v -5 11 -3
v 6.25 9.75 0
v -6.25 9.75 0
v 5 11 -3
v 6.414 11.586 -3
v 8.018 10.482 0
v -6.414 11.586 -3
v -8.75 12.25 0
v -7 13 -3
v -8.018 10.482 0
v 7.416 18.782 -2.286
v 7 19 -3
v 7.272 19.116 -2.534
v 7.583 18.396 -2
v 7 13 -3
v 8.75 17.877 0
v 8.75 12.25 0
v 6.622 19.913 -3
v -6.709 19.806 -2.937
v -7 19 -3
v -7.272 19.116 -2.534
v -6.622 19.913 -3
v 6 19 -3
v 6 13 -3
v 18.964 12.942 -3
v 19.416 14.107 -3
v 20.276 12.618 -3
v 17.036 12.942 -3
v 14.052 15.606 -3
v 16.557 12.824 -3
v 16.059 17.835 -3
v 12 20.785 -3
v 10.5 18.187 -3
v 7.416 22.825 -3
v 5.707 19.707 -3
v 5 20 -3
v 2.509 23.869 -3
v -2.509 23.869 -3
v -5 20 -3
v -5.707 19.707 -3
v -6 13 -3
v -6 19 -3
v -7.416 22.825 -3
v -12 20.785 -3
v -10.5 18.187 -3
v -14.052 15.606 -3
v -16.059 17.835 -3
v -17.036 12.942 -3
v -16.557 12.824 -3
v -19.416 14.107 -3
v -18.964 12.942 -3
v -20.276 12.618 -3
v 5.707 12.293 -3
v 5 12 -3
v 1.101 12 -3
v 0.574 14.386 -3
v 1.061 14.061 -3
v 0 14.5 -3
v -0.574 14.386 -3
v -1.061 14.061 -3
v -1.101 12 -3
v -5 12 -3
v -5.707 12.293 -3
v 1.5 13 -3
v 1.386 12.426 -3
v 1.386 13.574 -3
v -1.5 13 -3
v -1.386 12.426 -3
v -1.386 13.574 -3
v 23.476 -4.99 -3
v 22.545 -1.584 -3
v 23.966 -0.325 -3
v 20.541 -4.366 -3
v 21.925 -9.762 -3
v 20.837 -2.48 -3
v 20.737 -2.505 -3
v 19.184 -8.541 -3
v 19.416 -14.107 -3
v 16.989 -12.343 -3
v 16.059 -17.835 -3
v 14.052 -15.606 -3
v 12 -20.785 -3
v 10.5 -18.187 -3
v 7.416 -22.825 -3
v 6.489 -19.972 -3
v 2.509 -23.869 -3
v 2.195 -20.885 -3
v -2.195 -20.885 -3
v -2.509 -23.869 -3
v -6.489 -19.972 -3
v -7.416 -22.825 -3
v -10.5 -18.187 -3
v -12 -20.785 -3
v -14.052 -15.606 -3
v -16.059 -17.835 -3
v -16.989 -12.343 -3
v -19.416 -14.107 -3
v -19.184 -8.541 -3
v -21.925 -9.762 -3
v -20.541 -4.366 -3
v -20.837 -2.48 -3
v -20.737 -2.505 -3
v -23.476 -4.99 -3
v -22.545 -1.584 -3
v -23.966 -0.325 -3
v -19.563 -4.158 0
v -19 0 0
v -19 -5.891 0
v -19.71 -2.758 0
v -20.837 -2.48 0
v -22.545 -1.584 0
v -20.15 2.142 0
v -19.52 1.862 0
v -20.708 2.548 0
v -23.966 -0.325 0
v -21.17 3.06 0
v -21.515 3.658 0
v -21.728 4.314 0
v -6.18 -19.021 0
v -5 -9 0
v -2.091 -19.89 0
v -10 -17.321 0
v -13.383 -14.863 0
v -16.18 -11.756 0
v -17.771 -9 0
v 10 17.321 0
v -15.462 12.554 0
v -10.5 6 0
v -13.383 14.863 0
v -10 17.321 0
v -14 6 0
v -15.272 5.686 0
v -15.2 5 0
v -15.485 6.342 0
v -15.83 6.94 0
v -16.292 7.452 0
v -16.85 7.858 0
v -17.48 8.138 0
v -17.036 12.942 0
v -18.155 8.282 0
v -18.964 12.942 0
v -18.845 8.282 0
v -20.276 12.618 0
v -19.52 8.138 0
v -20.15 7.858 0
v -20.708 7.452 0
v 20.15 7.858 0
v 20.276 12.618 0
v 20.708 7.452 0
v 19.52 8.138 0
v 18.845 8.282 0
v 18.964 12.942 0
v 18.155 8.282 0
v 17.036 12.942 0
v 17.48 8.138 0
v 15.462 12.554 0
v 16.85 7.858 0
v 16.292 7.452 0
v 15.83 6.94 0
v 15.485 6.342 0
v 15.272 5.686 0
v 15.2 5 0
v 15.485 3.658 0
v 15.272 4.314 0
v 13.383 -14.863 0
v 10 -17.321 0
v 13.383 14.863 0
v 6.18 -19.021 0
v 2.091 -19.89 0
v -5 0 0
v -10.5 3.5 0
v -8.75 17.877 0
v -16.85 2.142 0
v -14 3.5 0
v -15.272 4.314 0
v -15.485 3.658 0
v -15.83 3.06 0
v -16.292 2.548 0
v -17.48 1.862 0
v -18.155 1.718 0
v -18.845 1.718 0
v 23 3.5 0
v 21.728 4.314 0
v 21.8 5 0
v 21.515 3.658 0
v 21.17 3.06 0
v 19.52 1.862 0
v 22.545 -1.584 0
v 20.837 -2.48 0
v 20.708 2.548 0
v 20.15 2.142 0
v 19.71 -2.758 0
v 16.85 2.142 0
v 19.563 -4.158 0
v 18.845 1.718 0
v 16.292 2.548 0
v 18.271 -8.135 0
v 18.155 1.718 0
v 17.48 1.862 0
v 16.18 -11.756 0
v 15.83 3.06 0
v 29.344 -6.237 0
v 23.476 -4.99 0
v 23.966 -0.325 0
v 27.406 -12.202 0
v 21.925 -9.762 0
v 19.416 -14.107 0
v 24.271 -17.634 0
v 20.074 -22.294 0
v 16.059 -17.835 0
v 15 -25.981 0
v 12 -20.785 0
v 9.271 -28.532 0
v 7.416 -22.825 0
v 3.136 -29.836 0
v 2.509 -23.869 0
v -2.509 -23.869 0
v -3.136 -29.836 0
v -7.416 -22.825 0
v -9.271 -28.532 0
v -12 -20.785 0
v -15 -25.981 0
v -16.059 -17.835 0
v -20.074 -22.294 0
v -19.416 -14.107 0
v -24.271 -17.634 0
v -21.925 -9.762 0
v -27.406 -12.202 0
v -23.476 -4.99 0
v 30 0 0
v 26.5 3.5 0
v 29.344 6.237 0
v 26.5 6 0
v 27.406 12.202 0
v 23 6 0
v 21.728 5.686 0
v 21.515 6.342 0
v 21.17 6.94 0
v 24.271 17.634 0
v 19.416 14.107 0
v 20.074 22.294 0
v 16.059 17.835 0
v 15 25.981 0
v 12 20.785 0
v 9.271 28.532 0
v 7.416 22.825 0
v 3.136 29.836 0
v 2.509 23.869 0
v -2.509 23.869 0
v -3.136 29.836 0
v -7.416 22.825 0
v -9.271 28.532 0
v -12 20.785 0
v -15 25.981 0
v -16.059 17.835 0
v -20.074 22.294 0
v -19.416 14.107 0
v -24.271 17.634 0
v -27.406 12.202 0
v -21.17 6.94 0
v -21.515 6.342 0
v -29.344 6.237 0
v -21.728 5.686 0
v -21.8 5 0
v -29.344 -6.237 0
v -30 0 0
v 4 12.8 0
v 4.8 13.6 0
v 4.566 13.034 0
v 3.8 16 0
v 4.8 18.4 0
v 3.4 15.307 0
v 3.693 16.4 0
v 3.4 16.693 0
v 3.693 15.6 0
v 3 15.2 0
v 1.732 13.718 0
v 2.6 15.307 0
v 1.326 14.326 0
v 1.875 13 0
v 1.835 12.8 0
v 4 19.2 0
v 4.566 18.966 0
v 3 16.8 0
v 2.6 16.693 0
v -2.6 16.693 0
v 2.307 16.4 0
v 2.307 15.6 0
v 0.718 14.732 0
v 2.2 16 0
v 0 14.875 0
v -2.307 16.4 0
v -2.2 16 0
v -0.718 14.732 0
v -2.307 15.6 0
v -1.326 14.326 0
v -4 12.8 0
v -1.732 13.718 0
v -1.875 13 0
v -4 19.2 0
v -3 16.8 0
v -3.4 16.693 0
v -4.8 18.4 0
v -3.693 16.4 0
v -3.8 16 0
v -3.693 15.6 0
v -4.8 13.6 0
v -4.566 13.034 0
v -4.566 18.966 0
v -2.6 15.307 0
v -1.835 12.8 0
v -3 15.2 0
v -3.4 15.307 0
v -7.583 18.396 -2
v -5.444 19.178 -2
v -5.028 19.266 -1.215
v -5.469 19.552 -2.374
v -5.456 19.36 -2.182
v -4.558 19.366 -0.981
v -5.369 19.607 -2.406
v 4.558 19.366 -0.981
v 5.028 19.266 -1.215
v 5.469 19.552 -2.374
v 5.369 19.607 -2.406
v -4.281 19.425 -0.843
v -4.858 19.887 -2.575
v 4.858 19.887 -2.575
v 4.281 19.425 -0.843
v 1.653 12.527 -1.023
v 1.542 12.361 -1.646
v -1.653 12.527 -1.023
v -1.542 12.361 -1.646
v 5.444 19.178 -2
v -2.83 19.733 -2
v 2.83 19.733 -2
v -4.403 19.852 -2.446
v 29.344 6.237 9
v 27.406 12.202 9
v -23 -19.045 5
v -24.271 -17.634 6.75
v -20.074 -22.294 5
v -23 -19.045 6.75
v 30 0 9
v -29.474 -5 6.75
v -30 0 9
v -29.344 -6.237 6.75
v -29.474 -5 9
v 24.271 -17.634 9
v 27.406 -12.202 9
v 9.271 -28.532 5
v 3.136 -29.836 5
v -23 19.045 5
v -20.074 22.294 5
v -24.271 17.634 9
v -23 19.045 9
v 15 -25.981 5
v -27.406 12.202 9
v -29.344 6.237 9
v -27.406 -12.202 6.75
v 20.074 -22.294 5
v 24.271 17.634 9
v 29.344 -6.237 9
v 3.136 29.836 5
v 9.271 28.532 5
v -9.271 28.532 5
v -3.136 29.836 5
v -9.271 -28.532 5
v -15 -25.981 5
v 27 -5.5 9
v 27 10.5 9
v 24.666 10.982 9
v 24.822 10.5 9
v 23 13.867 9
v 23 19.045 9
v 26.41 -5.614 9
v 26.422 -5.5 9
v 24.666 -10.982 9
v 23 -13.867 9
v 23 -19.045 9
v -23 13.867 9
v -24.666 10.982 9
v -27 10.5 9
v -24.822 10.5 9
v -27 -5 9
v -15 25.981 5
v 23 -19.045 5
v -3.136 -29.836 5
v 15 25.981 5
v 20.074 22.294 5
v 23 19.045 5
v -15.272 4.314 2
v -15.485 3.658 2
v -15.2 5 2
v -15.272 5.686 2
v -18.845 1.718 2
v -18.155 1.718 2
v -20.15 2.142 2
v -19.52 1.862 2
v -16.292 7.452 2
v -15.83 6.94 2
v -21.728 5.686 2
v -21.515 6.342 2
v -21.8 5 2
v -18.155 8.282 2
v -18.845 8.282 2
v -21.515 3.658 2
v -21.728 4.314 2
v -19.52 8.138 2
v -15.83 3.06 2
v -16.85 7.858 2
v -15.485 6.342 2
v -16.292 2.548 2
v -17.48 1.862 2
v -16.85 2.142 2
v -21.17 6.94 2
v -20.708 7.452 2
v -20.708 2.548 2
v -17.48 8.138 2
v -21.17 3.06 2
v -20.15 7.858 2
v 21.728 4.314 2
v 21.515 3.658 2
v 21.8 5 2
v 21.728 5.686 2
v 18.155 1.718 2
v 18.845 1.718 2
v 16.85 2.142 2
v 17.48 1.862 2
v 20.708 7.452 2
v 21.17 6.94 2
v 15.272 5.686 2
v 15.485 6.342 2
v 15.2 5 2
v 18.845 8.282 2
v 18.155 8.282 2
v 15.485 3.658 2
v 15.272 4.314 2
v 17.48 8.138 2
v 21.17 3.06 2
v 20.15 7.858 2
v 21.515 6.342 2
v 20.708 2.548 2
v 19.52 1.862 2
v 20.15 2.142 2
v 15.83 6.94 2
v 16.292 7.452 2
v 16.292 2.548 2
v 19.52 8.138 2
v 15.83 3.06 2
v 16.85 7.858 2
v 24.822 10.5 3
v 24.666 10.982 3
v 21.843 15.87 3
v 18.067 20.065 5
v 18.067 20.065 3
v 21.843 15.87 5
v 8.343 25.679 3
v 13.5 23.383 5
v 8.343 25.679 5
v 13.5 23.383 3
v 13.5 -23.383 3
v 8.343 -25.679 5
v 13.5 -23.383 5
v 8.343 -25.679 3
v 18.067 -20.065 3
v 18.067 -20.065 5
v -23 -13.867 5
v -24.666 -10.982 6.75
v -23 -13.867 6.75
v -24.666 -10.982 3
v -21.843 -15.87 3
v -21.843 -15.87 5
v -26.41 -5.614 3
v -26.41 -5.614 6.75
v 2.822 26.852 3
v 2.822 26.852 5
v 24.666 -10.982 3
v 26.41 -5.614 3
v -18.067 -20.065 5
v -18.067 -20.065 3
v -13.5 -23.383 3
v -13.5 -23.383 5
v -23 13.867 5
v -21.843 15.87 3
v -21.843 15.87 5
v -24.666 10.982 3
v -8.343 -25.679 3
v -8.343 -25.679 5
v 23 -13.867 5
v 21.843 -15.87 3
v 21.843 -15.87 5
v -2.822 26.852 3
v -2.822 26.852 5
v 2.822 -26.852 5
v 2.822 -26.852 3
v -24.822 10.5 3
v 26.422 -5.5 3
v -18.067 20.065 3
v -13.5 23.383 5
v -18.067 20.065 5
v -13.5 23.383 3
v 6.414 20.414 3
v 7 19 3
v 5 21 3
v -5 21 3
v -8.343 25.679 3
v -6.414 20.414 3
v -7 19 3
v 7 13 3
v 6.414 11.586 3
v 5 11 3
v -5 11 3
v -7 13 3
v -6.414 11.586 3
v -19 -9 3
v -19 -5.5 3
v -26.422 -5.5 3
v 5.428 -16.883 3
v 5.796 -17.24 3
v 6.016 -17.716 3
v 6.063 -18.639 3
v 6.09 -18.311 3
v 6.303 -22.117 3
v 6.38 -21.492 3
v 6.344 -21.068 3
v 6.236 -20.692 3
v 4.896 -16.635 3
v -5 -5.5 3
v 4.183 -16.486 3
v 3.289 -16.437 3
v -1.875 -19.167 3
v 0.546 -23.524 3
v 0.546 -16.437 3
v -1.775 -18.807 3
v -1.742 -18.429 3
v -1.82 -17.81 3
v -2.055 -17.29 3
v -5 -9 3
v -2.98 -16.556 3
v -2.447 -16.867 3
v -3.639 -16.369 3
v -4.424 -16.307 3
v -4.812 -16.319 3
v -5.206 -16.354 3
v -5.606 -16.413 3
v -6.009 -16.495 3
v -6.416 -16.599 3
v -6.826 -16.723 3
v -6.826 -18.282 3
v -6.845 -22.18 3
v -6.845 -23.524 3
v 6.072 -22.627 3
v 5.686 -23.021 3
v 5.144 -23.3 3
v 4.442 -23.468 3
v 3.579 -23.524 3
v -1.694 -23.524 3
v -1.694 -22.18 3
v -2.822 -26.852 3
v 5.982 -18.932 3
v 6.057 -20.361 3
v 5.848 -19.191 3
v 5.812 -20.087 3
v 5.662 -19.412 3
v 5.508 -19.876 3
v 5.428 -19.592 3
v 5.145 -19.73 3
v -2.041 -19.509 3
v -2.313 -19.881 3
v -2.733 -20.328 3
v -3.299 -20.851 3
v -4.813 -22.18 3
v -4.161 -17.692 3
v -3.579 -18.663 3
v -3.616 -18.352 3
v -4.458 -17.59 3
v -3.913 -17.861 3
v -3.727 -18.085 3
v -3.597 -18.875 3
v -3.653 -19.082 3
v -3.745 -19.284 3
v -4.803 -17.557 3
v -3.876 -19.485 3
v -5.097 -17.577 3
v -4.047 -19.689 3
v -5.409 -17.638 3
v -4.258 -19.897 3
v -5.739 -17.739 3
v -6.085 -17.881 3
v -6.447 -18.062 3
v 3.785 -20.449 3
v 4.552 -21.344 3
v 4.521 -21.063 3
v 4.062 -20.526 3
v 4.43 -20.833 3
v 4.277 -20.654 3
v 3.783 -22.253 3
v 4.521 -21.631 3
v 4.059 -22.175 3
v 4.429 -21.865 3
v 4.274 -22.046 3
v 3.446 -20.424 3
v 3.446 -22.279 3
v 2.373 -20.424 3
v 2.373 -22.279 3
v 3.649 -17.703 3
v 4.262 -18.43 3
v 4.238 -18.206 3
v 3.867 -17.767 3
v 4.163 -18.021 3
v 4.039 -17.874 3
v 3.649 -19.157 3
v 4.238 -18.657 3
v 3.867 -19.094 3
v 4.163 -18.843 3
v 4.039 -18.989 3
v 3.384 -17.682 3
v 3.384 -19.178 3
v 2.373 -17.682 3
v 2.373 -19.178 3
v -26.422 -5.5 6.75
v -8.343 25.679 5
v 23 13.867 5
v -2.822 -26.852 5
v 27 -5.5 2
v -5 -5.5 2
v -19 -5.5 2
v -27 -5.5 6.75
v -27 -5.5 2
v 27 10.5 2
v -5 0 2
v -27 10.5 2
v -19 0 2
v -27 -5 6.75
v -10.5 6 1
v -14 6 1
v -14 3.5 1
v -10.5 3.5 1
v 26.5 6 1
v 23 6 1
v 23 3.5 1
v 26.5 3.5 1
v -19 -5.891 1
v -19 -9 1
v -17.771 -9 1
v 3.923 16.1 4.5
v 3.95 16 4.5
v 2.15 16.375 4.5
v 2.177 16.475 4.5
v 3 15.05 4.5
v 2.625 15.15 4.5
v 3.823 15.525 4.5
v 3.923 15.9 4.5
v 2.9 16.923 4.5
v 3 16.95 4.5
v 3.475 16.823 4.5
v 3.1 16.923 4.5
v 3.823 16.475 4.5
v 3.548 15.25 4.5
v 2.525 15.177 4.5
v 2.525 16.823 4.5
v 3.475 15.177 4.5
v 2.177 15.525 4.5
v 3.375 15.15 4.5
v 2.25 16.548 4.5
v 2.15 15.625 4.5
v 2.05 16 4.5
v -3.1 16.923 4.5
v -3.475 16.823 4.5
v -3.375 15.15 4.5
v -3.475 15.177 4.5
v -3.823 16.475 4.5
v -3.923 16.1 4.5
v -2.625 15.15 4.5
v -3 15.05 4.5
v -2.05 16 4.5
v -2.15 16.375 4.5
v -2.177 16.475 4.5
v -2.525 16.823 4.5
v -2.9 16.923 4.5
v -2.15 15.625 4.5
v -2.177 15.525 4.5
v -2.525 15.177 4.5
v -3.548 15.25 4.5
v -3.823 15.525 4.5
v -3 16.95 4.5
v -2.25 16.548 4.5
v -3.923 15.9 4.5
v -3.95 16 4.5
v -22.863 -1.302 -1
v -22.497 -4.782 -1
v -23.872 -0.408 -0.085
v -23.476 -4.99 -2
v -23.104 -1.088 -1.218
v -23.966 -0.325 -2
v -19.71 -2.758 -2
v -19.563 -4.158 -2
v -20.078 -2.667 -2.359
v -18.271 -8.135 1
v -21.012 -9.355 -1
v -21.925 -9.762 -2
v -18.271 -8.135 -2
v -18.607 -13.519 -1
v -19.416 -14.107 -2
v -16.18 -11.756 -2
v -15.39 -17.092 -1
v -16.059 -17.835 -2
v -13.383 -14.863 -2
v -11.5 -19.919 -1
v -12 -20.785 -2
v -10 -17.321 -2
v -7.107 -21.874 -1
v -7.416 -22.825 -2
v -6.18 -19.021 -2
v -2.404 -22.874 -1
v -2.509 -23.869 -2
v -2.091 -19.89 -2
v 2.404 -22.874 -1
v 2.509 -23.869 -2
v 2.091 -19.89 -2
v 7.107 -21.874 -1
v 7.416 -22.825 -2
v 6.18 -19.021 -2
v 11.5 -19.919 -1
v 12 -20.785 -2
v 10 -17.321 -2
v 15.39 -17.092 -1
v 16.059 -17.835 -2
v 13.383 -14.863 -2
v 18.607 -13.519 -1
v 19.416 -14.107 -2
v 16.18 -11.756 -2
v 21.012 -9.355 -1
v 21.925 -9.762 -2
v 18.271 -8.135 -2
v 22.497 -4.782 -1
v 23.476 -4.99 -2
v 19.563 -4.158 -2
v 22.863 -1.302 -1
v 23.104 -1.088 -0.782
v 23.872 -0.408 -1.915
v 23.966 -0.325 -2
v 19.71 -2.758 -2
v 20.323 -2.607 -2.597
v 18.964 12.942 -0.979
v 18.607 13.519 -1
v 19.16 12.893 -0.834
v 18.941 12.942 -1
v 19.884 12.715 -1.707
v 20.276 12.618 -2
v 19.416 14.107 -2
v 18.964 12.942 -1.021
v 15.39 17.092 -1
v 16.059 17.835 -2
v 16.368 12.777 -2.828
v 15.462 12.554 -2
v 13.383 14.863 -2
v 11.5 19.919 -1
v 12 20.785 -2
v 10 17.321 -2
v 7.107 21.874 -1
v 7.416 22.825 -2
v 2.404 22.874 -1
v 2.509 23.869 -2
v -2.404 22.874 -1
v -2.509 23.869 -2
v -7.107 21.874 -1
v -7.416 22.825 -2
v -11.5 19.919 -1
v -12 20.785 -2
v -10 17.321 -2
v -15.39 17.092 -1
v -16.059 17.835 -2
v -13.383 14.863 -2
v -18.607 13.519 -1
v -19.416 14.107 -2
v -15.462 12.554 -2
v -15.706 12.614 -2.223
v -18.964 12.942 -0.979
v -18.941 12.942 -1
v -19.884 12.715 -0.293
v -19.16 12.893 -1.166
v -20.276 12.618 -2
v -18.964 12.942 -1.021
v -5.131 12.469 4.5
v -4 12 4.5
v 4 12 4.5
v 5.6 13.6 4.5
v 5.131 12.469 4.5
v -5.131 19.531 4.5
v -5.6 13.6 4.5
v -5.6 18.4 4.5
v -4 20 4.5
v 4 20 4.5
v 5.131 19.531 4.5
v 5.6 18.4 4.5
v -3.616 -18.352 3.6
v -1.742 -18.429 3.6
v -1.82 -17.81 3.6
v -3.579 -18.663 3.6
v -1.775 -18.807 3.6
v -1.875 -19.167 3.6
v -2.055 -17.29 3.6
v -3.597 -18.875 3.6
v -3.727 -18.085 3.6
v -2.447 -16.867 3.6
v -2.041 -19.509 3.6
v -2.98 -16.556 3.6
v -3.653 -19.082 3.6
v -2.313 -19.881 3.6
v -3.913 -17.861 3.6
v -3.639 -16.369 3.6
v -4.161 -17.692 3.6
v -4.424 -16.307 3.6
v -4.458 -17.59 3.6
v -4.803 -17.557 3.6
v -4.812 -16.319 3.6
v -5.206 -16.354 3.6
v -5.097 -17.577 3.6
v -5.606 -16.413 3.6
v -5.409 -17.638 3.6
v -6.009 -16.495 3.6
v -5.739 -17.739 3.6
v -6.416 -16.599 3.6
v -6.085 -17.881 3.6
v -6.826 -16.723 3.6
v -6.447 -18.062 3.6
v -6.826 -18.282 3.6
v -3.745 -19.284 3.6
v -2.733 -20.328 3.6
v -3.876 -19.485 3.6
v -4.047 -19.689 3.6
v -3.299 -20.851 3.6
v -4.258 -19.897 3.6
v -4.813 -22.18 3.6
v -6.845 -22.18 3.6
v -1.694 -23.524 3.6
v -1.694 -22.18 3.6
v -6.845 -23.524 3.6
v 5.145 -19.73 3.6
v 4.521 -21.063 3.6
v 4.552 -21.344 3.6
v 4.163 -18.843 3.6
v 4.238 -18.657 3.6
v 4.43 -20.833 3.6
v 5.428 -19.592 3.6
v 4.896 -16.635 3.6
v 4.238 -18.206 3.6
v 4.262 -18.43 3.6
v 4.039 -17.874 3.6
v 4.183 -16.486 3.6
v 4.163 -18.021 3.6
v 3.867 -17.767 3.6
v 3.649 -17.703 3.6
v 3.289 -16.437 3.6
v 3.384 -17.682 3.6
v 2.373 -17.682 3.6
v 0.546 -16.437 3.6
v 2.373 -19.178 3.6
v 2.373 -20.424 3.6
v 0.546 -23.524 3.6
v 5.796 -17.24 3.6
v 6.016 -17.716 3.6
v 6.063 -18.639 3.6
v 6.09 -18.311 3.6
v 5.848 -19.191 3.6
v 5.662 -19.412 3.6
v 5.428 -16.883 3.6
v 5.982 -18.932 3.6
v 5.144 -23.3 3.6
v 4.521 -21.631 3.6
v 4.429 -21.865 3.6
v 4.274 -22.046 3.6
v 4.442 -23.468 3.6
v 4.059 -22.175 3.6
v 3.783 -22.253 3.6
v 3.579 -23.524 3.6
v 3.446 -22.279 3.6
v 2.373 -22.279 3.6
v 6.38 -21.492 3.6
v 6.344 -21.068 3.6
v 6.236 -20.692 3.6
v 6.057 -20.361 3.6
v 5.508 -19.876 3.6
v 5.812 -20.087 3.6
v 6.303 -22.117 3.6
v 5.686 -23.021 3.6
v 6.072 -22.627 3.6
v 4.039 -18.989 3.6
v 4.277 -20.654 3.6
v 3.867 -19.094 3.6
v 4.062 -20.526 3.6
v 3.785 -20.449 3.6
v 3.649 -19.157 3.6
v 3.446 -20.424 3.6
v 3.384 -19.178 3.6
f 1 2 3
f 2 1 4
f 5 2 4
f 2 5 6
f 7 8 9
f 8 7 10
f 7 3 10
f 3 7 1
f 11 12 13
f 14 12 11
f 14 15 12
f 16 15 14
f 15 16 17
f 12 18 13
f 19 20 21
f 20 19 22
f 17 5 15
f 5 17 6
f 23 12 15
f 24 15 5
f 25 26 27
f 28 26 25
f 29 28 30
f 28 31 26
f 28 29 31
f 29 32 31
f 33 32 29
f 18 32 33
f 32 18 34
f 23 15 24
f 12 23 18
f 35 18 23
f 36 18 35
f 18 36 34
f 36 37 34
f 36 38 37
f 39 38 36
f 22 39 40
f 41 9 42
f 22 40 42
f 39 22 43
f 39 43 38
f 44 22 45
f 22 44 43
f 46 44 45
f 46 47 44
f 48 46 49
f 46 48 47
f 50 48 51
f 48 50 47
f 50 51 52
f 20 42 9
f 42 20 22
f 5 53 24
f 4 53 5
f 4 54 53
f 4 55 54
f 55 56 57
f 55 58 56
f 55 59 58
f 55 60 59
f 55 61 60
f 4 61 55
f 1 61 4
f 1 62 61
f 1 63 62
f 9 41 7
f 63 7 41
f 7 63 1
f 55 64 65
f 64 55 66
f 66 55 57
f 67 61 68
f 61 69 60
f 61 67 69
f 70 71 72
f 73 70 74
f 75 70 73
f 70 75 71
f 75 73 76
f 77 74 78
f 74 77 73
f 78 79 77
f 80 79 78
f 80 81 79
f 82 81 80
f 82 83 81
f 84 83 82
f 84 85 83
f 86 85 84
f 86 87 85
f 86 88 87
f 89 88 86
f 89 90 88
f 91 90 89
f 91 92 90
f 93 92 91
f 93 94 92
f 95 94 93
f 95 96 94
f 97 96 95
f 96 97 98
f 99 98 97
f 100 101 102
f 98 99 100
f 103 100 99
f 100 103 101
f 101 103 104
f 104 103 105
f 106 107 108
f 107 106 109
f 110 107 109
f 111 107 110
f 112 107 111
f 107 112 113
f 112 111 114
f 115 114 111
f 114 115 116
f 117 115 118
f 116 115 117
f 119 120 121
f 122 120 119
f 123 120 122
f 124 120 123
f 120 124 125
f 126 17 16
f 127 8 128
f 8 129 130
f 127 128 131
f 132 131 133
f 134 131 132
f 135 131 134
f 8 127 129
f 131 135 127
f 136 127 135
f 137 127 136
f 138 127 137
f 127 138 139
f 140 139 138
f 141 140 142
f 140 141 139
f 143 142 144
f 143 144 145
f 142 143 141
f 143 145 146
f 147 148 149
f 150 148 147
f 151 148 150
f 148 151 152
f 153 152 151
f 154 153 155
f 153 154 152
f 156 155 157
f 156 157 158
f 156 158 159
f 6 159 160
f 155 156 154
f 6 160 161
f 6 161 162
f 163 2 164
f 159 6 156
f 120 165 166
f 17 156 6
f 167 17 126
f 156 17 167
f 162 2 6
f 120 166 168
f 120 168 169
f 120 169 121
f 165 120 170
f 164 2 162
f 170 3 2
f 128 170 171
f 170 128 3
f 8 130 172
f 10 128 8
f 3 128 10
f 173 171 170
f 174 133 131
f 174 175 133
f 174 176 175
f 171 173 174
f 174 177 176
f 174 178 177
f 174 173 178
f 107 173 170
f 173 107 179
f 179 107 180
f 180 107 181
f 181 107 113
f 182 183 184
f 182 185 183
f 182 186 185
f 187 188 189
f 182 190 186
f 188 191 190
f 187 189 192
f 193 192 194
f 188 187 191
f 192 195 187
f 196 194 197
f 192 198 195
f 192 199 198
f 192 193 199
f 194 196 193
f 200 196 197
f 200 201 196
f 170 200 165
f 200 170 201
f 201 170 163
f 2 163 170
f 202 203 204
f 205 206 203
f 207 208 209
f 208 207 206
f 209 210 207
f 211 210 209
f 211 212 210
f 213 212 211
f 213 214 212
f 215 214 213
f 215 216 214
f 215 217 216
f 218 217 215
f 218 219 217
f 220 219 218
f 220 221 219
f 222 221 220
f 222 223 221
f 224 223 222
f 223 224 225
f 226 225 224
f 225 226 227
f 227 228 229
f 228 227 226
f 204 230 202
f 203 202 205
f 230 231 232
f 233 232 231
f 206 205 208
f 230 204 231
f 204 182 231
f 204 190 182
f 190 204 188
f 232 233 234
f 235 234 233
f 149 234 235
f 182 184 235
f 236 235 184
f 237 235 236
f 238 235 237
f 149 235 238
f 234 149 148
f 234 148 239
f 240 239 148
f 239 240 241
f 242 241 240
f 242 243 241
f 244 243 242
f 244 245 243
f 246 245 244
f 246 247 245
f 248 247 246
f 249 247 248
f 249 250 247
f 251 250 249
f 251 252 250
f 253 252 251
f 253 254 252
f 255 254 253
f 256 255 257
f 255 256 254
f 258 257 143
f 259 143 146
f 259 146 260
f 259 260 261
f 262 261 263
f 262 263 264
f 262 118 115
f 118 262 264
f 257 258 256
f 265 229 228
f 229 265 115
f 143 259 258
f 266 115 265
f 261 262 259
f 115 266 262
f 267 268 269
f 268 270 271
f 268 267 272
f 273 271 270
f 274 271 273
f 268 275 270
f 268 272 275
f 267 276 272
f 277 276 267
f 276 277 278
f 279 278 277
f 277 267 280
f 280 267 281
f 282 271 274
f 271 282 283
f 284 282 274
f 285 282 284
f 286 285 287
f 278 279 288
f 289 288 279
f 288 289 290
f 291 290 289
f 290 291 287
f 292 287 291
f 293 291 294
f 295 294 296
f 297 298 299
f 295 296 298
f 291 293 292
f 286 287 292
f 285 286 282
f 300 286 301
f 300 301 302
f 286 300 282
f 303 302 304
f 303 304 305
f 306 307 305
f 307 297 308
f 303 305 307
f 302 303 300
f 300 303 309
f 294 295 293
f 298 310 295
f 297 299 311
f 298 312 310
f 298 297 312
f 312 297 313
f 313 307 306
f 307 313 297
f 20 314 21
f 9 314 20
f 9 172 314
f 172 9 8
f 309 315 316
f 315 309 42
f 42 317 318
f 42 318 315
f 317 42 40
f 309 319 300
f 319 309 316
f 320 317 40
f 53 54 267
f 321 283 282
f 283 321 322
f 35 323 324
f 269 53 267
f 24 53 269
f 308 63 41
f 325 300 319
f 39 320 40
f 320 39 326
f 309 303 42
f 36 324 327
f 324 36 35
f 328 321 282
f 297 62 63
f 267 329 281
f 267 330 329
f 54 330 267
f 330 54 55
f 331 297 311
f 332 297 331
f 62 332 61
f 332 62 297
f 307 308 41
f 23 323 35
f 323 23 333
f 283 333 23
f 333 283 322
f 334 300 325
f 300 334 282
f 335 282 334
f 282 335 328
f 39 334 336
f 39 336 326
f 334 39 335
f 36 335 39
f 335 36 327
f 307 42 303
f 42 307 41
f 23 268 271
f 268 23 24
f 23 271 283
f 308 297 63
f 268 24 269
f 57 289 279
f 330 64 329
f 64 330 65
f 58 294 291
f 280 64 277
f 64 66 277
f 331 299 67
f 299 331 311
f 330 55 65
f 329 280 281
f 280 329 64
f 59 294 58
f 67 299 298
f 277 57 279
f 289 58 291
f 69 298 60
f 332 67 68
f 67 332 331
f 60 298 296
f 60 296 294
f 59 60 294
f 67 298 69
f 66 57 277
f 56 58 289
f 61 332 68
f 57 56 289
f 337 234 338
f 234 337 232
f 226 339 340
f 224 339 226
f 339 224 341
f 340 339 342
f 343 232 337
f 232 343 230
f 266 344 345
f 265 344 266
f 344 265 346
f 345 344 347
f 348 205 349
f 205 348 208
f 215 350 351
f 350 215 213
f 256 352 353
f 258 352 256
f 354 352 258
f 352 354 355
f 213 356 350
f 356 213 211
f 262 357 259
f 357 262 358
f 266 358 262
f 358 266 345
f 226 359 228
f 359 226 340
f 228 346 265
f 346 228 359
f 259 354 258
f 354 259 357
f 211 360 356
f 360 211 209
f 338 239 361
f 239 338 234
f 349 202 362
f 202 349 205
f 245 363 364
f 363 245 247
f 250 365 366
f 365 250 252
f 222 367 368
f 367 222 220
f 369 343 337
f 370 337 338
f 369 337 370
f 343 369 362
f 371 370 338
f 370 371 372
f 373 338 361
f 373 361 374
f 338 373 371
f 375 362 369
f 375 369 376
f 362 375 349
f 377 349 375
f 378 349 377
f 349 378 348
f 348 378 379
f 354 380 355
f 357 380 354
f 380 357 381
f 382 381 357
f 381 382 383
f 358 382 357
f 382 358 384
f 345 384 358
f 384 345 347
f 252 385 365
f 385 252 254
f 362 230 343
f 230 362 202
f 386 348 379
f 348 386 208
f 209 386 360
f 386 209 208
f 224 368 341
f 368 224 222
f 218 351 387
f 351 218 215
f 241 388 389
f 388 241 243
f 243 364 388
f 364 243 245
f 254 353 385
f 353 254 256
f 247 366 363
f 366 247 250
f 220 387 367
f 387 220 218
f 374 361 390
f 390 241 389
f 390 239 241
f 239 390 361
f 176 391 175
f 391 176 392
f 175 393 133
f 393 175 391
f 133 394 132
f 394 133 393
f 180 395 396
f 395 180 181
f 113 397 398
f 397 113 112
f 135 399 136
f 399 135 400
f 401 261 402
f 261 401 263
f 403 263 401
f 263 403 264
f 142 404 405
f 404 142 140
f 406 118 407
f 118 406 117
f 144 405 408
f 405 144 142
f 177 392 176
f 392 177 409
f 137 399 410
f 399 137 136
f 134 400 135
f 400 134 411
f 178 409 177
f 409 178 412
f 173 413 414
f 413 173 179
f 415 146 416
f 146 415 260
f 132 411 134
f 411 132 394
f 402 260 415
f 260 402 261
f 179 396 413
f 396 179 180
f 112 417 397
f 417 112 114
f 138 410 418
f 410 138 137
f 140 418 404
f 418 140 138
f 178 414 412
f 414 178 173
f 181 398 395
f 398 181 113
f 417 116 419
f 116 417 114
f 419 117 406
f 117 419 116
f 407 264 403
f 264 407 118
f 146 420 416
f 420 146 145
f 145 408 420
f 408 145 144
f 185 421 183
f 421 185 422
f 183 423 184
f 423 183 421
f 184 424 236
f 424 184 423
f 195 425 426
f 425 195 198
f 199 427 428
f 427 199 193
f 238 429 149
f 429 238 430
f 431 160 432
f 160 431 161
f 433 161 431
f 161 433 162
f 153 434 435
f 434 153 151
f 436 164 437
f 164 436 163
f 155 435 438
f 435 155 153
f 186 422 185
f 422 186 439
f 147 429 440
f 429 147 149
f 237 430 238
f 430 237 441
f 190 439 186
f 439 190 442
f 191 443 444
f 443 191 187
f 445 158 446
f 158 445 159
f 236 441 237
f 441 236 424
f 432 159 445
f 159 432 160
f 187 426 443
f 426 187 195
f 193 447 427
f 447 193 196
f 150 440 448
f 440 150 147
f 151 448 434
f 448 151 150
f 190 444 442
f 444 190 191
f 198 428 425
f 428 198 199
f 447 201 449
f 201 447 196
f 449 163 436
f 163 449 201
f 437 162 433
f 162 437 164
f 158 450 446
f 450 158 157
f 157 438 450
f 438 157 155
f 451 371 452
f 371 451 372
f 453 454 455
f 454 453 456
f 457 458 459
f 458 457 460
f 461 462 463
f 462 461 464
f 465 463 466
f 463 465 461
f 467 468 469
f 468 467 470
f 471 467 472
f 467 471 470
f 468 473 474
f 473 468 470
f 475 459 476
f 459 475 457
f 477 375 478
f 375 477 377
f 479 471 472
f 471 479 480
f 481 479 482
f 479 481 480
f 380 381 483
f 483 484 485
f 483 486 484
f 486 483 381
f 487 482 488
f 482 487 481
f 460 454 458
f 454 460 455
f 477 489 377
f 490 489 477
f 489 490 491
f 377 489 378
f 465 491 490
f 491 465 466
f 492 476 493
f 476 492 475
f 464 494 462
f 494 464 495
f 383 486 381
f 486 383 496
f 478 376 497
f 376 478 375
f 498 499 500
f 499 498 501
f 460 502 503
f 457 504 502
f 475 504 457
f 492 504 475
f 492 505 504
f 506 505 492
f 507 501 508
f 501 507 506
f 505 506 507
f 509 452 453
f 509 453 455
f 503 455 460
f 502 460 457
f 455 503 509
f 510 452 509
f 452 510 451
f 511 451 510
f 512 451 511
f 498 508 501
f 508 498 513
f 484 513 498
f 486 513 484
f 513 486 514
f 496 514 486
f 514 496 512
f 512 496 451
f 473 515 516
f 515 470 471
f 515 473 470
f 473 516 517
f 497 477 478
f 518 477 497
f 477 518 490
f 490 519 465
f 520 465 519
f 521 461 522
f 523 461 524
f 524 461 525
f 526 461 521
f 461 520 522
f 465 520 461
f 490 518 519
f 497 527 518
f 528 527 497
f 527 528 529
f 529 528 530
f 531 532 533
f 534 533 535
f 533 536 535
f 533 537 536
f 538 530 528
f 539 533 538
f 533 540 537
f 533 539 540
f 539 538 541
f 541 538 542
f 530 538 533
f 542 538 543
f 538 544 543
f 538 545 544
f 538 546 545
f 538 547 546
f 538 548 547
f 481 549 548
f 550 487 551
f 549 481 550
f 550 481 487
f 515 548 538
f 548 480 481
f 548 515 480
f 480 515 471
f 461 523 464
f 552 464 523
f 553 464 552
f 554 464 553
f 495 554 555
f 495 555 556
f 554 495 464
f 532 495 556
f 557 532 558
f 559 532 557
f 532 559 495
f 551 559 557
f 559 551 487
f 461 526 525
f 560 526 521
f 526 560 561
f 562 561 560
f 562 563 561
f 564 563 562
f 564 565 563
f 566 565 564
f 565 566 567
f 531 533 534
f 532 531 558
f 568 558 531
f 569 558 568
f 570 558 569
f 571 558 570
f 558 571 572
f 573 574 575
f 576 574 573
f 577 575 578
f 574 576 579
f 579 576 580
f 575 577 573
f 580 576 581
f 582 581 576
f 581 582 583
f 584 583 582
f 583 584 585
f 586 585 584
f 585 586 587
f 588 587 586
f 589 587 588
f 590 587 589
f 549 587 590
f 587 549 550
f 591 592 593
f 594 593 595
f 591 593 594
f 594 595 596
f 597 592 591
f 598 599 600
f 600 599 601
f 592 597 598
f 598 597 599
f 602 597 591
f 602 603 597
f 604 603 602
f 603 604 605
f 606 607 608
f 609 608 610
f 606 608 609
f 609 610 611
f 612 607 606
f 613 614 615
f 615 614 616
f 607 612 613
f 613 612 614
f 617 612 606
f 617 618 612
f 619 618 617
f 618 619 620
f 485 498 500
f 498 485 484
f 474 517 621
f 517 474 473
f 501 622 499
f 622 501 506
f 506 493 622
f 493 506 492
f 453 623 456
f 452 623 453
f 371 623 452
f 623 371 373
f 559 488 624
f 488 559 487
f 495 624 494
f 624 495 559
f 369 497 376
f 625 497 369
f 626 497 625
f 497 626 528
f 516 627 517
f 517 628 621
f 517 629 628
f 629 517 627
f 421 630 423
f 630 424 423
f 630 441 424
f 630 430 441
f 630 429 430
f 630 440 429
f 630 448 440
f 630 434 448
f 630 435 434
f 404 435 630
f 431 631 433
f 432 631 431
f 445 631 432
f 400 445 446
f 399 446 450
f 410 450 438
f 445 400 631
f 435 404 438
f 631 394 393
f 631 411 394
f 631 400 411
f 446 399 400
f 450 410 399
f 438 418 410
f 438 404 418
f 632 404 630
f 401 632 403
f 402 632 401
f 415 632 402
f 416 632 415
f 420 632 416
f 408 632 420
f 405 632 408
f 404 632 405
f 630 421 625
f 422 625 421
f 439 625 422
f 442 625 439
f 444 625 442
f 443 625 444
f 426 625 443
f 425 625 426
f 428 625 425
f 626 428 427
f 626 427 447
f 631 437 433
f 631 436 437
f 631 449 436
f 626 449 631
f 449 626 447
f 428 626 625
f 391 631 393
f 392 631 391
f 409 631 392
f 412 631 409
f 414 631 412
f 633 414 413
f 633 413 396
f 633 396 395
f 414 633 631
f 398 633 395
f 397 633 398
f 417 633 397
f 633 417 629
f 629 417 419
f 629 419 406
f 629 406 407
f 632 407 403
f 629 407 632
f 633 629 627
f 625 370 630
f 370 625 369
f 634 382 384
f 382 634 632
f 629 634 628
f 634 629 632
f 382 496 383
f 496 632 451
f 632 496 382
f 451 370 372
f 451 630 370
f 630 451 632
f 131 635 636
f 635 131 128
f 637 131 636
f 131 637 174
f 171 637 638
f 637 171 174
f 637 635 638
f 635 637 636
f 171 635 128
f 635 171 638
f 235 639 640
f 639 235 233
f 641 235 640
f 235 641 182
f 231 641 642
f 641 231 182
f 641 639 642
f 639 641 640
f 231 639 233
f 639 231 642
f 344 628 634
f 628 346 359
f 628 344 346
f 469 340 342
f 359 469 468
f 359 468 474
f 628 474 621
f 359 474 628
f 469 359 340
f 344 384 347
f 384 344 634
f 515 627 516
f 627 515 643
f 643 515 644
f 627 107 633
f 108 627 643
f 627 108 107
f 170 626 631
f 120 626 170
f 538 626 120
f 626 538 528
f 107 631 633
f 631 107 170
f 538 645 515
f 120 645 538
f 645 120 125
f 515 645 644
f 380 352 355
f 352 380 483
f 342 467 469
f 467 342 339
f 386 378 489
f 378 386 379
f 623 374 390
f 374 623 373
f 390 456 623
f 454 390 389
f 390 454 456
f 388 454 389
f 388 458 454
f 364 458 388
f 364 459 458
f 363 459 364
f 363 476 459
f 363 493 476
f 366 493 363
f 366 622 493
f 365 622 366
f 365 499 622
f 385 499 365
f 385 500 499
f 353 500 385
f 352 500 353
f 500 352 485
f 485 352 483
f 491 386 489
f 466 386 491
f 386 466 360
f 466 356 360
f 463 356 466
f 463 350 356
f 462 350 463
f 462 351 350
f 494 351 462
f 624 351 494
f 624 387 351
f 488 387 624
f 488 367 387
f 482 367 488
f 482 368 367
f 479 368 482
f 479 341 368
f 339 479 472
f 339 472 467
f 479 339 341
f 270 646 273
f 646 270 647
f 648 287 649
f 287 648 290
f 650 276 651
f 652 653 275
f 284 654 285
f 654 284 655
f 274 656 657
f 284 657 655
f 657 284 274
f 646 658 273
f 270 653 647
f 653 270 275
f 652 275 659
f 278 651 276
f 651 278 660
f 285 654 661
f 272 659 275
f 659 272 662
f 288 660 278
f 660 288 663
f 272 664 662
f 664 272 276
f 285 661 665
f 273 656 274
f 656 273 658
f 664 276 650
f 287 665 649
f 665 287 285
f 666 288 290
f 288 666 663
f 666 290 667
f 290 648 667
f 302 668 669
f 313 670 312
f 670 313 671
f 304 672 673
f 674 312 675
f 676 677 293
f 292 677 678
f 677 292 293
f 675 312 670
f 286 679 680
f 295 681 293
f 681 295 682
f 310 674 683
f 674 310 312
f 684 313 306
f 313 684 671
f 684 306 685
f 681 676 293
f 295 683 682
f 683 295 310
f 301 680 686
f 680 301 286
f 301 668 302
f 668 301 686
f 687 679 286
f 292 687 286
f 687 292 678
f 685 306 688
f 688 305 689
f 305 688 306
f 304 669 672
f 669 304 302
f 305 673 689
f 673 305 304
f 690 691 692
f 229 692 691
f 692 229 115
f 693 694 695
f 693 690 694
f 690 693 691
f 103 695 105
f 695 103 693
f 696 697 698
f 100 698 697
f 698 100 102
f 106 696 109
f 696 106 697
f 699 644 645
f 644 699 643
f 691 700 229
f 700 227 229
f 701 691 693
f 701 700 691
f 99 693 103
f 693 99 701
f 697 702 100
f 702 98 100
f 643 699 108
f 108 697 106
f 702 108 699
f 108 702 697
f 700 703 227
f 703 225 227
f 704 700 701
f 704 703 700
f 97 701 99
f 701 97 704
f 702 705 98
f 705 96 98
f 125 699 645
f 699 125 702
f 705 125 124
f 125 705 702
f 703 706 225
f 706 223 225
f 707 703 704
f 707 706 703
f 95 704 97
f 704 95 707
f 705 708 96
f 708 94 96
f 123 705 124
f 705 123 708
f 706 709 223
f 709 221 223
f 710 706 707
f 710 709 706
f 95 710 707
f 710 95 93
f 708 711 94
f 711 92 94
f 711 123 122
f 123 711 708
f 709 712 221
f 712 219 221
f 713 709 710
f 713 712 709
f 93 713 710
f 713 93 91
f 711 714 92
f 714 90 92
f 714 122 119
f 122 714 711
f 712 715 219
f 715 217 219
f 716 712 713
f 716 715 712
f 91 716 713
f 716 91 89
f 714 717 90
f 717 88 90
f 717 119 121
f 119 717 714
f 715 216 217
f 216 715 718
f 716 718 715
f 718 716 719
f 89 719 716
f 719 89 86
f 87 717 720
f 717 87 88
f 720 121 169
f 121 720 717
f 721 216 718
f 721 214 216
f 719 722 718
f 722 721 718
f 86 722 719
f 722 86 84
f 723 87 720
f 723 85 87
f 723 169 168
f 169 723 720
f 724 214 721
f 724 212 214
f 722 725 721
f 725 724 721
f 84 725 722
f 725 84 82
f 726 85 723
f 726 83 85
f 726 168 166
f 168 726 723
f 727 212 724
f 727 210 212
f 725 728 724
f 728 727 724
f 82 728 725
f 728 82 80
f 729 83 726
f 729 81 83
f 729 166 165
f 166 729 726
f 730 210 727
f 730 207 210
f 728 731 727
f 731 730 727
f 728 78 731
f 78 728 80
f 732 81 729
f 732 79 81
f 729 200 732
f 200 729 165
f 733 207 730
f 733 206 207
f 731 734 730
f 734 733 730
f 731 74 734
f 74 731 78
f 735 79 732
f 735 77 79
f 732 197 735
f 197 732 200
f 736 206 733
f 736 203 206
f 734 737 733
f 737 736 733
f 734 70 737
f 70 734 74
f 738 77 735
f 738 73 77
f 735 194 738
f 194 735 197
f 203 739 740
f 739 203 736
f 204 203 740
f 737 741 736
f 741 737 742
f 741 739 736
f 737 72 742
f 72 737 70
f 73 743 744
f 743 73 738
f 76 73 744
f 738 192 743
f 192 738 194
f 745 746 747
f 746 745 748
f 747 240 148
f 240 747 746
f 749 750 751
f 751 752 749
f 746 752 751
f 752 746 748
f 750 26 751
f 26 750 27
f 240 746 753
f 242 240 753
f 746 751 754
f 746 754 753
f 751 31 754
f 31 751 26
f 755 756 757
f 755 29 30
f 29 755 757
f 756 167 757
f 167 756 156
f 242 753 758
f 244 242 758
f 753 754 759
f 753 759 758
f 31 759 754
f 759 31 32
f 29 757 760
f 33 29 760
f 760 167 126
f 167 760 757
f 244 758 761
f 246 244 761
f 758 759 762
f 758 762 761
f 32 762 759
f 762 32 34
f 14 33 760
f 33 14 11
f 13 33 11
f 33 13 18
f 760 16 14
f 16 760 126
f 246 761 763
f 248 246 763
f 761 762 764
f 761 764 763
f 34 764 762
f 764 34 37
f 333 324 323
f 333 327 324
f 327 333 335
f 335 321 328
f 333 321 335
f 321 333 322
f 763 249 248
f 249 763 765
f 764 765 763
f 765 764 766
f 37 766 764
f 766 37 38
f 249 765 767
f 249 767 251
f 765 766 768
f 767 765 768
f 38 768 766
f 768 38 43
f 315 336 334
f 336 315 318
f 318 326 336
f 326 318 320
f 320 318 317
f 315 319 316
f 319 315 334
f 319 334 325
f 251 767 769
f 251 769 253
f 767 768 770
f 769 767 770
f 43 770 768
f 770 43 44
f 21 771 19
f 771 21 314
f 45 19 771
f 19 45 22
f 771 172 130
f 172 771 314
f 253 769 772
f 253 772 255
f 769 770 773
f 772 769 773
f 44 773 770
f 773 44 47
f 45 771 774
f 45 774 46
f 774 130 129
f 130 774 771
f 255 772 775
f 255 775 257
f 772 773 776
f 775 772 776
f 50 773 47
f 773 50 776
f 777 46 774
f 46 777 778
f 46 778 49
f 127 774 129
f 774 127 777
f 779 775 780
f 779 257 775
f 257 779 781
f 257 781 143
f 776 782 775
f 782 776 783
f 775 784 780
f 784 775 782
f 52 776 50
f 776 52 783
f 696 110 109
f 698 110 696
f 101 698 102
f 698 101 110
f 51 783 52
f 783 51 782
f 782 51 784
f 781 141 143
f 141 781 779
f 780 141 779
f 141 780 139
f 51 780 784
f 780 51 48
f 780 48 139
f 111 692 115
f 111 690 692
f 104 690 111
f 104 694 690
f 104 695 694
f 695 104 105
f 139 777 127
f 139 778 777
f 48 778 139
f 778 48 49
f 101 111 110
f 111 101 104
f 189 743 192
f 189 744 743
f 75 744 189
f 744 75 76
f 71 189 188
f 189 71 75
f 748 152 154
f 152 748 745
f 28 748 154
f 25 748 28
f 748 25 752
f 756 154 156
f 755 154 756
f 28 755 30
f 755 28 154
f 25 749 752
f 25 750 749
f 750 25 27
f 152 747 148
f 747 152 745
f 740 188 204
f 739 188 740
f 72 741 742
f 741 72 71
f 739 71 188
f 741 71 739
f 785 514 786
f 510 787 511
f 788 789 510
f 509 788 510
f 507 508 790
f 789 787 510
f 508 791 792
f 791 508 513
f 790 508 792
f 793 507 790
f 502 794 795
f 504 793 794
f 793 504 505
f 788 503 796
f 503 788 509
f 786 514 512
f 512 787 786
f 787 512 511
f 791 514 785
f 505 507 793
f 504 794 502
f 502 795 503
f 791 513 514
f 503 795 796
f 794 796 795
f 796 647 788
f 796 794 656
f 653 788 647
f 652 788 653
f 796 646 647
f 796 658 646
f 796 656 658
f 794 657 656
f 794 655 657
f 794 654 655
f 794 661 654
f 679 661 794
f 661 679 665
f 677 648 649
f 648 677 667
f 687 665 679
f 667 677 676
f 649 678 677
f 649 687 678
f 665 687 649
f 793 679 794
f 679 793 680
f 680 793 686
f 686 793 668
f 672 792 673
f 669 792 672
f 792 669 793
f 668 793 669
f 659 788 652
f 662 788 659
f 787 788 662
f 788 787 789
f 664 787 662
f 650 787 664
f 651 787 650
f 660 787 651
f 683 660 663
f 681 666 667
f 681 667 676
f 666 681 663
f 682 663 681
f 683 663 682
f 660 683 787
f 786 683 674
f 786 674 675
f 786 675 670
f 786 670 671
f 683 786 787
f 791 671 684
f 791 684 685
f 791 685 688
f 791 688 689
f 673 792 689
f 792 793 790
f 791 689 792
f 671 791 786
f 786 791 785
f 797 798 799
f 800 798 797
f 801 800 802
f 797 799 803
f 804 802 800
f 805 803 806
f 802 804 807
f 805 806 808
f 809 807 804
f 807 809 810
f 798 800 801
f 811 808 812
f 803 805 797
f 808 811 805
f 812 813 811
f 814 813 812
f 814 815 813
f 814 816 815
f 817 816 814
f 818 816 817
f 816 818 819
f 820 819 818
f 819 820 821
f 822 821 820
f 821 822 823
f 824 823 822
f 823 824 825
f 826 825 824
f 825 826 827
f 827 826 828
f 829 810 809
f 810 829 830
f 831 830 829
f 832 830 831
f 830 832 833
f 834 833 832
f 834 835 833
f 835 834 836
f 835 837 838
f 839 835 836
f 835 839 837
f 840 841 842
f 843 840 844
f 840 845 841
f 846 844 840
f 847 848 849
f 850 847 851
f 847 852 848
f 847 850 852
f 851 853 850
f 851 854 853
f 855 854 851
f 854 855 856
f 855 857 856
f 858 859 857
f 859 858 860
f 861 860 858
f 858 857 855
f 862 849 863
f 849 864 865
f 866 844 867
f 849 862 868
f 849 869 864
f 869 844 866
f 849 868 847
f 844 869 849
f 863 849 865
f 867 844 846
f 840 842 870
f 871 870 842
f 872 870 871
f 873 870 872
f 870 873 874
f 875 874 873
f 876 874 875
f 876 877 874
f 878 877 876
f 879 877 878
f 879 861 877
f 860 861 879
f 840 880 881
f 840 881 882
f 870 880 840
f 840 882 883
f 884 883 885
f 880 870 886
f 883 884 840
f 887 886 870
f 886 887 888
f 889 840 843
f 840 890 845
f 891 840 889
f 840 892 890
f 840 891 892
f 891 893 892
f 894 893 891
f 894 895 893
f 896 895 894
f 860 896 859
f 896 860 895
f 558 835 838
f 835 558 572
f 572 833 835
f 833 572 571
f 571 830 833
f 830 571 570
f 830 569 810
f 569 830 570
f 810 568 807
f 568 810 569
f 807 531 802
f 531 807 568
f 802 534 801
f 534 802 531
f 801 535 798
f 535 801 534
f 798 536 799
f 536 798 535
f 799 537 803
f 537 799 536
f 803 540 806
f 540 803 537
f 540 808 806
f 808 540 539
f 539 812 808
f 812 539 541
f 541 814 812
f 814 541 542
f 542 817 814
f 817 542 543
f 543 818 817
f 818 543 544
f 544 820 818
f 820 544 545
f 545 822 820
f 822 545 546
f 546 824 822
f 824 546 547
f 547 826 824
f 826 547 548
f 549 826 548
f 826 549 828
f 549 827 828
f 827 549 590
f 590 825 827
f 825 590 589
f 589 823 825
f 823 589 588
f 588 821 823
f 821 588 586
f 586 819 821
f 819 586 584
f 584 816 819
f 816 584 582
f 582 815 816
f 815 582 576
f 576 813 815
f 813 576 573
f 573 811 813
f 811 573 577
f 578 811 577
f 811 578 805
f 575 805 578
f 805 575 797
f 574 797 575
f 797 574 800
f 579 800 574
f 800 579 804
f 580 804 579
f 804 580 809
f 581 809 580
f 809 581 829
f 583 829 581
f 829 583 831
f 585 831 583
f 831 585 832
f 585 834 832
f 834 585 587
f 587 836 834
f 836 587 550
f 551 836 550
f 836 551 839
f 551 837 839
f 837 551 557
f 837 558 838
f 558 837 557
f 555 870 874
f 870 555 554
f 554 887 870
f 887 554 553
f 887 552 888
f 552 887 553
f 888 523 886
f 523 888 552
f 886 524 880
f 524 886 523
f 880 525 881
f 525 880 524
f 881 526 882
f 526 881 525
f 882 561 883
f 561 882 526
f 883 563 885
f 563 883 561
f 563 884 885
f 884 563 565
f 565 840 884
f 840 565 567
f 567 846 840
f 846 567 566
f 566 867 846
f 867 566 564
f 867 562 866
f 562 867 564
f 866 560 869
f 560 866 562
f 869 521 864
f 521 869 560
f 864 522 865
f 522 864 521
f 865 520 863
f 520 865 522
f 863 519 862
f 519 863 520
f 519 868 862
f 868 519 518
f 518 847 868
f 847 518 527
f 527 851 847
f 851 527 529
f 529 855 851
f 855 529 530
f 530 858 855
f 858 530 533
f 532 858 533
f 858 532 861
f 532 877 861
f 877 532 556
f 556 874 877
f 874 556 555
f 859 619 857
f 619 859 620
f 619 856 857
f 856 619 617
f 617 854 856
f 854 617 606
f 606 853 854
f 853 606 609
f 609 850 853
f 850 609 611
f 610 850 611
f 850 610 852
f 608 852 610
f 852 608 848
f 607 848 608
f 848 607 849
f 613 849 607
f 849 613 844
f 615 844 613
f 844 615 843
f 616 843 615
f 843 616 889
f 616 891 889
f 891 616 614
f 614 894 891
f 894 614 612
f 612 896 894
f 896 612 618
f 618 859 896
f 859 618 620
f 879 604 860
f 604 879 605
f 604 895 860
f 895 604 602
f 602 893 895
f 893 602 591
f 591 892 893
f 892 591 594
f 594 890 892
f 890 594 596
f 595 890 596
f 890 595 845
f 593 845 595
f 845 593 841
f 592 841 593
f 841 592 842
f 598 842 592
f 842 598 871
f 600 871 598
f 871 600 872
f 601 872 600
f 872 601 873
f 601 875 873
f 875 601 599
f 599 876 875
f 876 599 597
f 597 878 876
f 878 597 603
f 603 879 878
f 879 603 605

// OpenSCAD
tol=0.25;

difference(){

// Base boss
    union(){
        translate([0,0,0]) color("yellow")
        linear_extrude(height=9)  circle(r=30,center=true);

        // This is the pogo pin surround
        translate([0,16,-3]) color("green"){
            difference(){
                linear_extrude(height=3,scale=1.25)
                offset(r=2,$fn=8) square(size=[10,6],center=true);

                linear_extrude(height=3,scale=0.8)
                offset(r=1,$fn=8) square(size=[10,6],center=true);
            }
            translate([0,-3,0]) color("orange")
            linear_extrude(height=3,scale=1.25)  circle(r=1.5,$fn=16,center=true);
        }

    }
    // holes for pogo pins
    translate([3,16,0]) cylinder(r1=0.8,r2=1.0,h=6,$fn=12);
    translate([-3,16,0]) cylinder(r1=0.8,r2=1.0,h=6,$fn=12);

    
// Simplified version of BB1a
    translate([-27,-1,2]) rotate([90,0,0])
    union(){
        translate([27,1,-1]) color("pink") rotate([-90,0,0])
        linear_extrude(height=65)  circle(r=27,center=true);

        // Base 1 plate
        B1p=[ [0,0], [54,0], [54,70], [44,80],
        [10,80], [0,70] ];
        translate([0,0,0]) color("gray")
        linear_extrude(height=4.5)
        polygon(points=B1p);

        // Switch mounts
        translate ([0,0,-11]) color("gray") 
            linear_extrude(height=11) 
            square(size=[54, 2]);
        
        // Bottom side outer rail  THICKENED 
        translate ([0,0,-11.5]) color("gray") 
            linear_extrude(height=11.5,convexity=100) polygon(points=B1p);
        
        // Switch 1
        translate([2,1.6,-11]) color("green"){
            union(){
                // switch body including solder lug clearance
                linear_extrude(height=12) 
                offset(r=tol)
                 square(size=[13, 15]);
                
                translate([6.5,0,5]) rotate([90,0,0]) cylinder(r=3.3,h=10,$fn=30);
            }
        }
        // Switch 2
        translate([54-15,1.6,-11]) color("blue"){
            union(){
                // switch body including solder lug clearance
                linear_extrude(height=12) 
                offset(r=tol)
                 square(size=[13, 15]);
                
                translate([6.5,0,5]) rotate([90,0,0]) cylinder(r=3.3,h=10,$fn=30);
            }
        }

        // anti rotate slot for switches
        translate([13,-2,-7]) color("green"){
                linear_extrude(height=2.5) 
                 square(size=[3.5, 1.0]);
        }
        translate([50,-2,-7]) color("blue"){
                linear_extrude(height=2.5) 
                 square(size=[3.5, 1.0]);
        }

        // add a block between switches for cutout
        translate([2,1.6,-11]) color("orange"){
            linear_extrude(height=12) 
            offset(r=tol)
             square(size=[50, 25]);
        }
        
        // extra block  cutout for the battery cable
        translate([-4,5,4]) color("pink"){
            linear_extrude(height=18) 
            offset(r=tol)
             square(size=[14, 14]);
        }
        
        // another cutout for the USB charger plug
        translate([8,-4,-1]) color("red"){
            linear_extrude(height=9) 
            offset(r=1,$fn=8) offset(r=-1,$fn=8)
            square(size=[14, 16]);
        }
        
        // Front to back cut
        translate([4,3,-40]) color("cyan"){
            // switch body including solder lug clearance
            linear_extrude(height=80) 
             square(size=[46, 30]);
        }
        
        
    }  // end of BB1a union
} // end of top boss difference cuts   
    
difference(){
    // Bottom side boss
    pb1=[ [24,0], [20,0], [20,3], [21,4], [24,4], [24,3],
    [23,2], [24,1] ];
    translate([0,0,1]) rotate([180,0,0]) color("orange")
    rotate_extrude(convexity=20) polygon(points=pb1);

    // cutaways for access
        translate([-18,5,-4]) color("cyan"){
            cylinder(r=8,h=10);
        }
        translate([18,5,-4]) color("cyan"){
            cylinder(r=8,h=10);
        }
}    


// add text for Brights
translate ([0,-20,2.4]) rotate([0,0,0]) color("red") 
    linear_extrude(height=1.2){
    text("2B", font = "Open Sans:style=Bold", size=7,halign="center",valign="center",spacing=1.1);
    }

difference(){
    // topside reinforce pogo pins
    translate([0,16,3.0]) color("red")
    linear_extrude(height=1.5,scale=0.8)
    offset(r=2,$fn=8) square(size=[10,6],center=true);

    // recut holes for pogo pins
    translate([3,16,0]) cylinder(r1=0.8,r2=1.0,h=6,$fn=12);
    translate([-3,16,0]) cylinder(r1=0.8,r2=1.0,h=6,$fn=12);
}
